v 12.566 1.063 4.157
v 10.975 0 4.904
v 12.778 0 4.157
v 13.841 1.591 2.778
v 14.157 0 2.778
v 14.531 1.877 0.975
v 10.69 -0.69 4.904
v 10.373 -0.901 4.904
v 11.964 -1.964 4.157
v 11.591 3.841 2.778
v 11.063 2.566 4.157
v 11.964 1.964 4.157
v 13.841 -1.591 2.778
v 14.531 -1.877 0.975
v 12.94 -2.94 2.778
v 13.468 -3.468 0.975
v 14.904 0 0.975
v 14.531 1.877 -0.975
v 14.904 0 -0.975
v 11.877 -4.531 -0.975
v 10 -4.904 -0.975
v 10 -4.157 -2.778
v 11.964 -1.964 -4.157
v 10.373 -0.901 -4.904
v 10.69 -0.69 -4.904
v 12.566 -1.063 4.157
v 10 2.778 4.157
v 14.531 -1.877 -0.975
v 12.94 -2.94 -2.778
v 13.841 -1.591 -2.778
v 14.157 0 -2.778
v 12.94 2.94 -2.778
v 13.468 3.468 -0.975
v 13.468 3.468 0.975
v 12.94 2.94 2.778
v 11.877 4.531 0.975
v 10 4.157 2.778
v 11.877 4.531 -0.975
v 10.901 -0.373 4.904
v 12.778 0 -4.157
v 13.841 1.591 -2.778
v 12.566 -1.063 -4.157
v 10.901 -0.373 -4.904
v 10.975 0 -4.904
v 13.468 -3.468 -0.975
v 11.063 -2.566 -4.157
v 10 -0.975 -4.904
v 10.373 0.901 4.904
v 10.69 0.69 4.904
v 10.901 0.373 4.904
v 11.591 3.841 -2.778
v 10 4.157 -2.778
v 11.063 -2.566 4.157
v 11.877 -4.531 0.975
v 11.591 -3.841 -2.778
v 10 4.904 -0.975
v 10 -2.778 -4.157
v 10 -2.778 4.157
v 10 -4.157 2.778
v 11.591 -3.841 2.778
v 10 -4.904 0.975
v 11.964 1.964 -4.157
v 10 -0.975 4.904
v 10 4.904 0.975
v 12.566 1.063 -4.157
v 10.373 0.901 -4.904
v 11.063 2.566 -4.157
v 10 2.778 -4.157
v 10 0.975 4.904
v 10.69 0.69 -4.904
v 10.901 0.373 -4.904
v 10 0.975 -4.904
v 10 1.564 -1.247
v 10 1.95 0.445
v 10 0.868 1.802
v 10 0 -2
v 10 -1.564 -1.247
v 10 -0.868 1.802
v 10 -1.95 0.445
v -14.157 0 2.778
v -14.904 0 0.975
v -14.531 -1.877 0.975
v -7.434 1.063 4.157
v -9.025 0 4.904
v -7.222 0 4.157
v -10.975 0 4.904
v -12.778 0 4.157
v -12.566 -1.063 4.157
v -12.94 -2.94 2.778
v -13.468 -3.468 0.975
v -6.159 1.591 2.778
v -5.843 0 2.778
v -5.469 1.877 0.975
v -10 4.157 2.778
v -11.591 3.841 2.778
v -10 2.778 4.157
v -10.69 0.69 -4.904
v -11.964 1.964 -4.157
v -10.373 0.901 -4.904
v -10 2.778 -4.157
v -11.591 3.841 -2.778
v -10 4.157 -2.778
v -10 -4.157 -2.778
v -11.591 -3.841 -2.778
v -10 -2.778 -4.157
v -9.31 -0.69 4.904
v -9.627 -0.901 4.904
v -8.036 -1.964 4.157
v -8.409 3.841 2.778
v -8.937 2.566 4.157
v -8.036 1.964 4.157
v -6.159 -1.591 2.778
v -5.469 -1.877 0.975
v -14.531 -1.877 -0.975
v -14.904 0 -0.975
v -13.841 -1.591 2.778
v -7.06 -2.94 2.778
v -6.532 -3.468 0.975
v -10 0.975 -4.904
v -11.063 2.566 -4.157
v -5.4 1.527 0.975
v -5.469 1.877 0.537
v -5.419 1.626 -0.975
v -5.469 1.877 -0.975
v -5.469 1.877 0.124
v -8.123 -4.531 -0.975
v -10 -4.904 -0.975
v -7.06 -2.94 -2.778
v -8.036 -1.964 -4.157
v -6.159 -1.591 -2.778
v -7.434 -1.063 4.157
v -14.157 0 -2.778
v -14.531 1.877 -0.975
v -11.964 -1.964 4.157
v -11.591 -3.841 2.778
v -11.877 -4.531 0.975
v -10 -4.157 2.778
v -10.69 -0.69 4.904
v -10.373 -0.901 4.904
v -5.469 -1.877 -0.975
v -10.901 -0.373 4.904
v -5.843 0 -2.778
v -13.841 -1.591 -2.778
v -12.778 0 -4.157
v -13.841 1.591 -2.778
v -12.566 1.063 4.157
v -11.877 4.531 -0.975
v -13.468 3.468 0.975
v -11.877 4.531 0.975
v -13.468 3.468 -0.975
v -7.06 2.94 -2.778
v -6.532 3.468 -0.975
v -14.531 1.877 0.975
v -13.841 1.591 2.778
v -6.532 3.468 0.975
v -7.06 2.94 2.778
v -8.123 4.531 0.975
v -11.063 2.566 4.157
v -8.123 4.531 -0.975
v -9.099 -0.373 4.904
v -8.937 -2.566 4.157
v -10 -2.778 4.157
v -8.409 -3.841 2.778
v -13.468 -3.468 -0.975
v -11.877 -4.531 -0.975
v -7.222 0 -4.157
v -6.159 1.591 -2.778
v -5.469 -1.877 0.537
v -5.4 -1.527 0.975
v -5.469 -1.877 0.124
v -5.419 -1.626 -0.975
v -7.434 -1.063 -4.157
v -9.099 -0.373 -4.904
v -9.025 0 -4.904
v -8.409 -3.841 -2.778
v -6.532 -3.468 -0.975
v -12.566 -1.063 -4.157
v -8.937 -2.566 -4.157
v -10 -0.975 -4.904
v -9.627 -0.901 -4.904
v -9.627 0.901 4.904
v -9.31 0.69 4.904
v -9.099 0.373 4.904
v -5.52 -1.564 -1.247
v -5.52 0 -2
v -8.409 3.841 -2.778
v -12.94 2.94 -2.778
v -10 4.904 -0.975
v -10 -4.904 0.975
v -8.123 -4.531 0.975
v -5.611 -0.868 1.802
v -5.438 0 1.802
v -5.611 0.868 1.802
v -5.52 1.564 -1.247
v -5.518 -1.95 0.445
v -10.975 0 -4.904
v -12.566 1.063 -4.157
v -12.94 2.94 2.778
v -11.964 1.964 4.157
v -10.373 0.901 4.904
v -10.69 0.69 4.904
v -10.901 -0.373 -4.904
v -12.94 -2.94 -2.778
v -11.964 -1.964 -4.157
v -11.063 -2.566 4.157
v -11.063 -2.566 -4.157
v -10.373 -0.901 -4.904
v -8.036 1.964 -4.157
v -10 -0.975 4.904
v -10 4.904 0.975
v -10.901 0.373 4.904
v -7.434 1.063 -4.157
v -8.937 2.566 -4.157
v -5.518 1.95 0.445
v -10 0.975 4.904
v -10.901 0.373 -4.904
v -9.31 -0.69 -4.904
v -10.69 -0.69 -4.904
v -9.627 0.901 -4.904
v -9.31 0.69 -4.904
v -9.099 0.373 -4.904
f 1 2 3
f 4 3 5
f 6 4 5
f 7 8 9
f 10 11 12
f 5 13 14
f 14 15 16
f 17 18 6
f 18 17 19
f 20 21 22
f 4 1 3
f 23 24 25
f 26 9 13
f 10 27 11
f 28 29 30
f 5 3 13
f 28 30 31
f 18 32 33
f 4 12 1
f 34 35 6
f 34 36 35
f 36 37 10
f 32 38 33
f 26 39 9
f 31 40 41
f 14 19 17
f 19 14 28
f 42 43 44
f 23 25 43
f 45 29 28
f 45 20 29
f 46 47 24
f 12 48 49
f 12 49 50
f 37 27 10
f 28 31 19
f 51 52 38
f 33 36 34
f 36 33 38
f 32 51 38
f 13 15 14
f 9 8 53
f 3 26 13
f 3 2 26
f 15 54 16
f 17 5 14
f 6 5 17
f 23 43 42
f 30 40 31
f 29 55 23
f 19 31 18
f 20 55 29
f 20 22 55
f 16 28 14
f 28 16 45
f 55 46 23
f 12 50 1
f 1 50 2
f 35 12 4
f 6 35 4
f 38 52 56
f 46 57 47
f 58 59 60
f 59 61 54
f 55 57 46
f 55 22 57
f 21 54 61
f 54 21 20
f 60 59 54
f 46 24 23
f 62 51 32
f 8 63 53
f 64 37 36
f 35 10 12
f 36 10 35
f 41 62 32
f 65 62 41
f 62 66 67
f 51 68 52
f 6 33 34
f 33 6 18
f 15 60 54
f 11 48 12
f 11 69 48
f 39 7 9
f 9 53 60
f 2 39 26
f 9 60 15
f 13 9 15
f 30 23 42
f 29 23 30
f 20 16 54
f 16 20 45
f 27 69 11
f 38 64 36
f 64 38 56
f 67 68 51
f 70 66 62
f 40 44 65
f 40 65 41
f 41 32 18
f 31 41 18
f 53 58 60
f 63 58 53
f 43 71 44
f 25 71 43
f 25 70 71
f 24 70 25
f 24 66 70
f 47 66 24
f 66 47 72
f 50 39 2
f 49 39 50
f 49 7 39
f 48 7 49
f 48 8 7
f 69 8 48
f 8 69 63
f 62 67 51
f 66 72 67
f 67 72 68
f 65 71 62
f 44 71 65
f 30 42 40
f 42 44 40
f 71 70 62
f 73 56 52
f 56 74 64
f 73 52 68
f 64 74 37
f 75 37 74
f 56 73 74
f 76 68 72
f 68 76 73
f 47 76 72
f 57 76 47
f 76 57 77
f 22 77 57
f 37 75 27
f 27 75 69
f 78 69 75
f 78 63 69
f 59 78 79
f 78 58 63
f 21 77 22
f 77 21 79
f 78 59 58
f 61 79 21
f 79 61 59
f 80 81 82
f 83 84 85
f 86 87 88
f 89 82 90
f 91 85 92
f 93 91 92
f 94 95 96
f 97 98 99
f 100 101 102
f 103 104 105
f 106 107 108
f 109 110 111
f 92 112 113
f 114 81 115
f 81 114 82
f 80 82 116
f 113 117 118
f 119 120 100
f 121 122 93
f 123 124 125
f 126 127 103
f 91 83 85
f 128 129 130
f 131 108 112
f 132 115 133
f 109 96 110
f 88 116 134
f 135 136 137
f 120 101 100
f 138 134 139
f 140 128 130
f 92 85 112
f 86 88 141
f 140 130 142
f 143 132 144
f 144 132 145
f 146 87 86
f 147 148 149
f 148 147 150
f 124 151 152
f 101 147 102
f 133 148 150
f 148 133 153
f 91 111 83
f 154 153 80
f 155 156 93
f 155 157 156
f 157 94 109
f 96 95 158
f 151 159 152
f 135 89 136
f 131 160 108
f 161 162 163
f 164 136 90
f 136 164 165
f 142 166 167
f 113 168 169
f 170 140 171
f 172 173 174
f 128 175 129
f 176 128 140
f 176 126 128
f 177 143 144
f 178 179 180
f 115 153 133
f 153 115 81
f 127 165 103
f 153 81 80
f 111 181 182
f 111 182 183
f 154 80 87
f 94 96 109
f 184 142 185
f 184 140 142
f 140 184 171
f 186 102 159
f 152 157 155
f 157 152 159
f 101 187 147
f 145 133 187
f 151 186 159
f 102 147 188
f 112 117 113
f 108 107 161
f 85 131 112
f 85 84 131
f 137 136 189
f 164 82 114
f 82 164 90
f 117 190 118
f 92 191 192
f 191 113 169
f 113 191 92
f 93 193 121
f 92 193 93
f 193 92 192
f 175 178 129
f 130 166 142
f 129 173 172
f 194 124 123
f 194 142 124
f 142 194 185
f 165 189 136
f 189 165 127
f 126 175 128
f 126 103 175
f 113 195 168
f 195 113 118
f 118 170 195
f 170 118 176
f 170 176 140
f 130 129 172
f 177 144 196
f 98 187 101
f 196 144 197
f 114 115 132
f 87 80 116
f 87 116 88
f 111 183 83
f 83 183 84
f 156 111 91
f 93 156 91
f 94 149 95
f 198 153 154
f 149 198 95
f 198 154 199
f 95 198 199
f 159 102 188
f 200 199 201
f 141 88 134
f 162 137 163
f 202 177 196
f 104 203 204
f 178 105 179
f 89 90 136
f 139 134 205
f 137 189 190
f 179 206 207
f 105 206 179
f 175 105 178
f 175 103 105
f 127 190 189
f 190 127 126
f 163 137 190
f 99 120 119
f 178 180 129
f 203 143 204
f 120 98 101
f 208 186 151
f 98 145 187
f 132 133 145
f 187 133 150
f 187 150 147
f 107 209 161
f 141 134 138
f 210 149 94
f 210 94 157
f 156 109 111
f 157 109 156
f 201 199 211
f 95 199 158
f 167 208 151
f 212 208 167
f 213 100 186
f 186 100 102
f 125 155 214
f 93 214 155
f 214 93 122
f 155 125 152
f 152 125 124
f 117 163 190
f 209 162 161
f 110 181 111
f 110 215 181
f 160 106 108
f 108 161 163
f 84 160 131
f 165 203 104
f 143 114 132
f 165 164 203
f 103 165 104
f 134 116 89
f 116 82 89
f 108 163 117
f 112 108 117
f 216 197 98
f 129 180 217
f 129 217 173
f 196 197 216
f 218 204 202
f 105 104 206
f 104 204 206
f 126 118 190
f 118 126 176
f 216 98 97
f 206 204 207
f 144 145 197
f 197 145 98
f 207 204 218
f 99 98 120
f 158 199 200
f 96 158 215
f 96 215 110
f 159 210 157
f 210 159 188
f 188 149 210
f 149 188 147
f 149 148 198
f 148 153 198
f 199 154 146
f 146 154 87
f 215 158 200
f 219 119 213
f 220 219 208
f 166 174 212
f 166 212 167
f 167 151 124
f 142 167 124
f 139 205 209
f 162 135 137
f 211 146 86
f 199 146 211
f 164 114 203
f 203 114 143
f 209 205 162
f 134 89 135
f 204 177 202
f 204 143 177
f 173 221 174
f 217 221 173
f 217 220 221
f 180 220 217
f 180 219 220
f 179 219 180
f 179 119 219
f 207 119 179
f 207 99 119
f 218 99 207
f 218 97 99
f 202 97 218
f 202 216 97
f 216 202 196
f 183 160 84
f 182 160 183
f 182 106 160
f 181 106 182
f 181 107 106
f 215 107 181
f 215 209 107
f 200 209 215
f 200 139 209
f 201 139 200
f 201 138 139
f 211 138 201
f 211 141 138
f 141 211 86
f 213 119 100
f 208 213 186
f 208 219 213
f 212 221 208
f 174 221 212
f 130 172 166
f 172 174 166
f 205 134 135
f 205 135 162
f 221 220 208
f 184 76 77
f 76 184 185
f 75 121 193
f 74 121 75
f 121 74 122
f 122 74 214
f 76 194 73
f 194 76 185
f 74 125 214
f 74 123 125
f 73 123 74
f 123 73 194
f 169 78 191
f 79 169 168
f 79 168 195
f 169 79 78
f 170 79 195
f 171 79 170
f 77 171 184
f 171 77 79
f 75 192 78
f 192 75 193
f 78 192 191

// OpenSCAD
union() {
//one weight
    translate([-10,0,0])
        difference() {  // cut weight in half
            sphere(r=5);
%           translate([0,-5,-5]) cube(10);
        }
// bar
    rotate([0,90,0]) cylinder(r=2,h=20, center=true);
// other weight
    translate([10,0,0])
        difference() { // cut weight in half in other direction
            sphere(r=5);
                translate([-10,-5,-5]) cube(10);
        }
} 
